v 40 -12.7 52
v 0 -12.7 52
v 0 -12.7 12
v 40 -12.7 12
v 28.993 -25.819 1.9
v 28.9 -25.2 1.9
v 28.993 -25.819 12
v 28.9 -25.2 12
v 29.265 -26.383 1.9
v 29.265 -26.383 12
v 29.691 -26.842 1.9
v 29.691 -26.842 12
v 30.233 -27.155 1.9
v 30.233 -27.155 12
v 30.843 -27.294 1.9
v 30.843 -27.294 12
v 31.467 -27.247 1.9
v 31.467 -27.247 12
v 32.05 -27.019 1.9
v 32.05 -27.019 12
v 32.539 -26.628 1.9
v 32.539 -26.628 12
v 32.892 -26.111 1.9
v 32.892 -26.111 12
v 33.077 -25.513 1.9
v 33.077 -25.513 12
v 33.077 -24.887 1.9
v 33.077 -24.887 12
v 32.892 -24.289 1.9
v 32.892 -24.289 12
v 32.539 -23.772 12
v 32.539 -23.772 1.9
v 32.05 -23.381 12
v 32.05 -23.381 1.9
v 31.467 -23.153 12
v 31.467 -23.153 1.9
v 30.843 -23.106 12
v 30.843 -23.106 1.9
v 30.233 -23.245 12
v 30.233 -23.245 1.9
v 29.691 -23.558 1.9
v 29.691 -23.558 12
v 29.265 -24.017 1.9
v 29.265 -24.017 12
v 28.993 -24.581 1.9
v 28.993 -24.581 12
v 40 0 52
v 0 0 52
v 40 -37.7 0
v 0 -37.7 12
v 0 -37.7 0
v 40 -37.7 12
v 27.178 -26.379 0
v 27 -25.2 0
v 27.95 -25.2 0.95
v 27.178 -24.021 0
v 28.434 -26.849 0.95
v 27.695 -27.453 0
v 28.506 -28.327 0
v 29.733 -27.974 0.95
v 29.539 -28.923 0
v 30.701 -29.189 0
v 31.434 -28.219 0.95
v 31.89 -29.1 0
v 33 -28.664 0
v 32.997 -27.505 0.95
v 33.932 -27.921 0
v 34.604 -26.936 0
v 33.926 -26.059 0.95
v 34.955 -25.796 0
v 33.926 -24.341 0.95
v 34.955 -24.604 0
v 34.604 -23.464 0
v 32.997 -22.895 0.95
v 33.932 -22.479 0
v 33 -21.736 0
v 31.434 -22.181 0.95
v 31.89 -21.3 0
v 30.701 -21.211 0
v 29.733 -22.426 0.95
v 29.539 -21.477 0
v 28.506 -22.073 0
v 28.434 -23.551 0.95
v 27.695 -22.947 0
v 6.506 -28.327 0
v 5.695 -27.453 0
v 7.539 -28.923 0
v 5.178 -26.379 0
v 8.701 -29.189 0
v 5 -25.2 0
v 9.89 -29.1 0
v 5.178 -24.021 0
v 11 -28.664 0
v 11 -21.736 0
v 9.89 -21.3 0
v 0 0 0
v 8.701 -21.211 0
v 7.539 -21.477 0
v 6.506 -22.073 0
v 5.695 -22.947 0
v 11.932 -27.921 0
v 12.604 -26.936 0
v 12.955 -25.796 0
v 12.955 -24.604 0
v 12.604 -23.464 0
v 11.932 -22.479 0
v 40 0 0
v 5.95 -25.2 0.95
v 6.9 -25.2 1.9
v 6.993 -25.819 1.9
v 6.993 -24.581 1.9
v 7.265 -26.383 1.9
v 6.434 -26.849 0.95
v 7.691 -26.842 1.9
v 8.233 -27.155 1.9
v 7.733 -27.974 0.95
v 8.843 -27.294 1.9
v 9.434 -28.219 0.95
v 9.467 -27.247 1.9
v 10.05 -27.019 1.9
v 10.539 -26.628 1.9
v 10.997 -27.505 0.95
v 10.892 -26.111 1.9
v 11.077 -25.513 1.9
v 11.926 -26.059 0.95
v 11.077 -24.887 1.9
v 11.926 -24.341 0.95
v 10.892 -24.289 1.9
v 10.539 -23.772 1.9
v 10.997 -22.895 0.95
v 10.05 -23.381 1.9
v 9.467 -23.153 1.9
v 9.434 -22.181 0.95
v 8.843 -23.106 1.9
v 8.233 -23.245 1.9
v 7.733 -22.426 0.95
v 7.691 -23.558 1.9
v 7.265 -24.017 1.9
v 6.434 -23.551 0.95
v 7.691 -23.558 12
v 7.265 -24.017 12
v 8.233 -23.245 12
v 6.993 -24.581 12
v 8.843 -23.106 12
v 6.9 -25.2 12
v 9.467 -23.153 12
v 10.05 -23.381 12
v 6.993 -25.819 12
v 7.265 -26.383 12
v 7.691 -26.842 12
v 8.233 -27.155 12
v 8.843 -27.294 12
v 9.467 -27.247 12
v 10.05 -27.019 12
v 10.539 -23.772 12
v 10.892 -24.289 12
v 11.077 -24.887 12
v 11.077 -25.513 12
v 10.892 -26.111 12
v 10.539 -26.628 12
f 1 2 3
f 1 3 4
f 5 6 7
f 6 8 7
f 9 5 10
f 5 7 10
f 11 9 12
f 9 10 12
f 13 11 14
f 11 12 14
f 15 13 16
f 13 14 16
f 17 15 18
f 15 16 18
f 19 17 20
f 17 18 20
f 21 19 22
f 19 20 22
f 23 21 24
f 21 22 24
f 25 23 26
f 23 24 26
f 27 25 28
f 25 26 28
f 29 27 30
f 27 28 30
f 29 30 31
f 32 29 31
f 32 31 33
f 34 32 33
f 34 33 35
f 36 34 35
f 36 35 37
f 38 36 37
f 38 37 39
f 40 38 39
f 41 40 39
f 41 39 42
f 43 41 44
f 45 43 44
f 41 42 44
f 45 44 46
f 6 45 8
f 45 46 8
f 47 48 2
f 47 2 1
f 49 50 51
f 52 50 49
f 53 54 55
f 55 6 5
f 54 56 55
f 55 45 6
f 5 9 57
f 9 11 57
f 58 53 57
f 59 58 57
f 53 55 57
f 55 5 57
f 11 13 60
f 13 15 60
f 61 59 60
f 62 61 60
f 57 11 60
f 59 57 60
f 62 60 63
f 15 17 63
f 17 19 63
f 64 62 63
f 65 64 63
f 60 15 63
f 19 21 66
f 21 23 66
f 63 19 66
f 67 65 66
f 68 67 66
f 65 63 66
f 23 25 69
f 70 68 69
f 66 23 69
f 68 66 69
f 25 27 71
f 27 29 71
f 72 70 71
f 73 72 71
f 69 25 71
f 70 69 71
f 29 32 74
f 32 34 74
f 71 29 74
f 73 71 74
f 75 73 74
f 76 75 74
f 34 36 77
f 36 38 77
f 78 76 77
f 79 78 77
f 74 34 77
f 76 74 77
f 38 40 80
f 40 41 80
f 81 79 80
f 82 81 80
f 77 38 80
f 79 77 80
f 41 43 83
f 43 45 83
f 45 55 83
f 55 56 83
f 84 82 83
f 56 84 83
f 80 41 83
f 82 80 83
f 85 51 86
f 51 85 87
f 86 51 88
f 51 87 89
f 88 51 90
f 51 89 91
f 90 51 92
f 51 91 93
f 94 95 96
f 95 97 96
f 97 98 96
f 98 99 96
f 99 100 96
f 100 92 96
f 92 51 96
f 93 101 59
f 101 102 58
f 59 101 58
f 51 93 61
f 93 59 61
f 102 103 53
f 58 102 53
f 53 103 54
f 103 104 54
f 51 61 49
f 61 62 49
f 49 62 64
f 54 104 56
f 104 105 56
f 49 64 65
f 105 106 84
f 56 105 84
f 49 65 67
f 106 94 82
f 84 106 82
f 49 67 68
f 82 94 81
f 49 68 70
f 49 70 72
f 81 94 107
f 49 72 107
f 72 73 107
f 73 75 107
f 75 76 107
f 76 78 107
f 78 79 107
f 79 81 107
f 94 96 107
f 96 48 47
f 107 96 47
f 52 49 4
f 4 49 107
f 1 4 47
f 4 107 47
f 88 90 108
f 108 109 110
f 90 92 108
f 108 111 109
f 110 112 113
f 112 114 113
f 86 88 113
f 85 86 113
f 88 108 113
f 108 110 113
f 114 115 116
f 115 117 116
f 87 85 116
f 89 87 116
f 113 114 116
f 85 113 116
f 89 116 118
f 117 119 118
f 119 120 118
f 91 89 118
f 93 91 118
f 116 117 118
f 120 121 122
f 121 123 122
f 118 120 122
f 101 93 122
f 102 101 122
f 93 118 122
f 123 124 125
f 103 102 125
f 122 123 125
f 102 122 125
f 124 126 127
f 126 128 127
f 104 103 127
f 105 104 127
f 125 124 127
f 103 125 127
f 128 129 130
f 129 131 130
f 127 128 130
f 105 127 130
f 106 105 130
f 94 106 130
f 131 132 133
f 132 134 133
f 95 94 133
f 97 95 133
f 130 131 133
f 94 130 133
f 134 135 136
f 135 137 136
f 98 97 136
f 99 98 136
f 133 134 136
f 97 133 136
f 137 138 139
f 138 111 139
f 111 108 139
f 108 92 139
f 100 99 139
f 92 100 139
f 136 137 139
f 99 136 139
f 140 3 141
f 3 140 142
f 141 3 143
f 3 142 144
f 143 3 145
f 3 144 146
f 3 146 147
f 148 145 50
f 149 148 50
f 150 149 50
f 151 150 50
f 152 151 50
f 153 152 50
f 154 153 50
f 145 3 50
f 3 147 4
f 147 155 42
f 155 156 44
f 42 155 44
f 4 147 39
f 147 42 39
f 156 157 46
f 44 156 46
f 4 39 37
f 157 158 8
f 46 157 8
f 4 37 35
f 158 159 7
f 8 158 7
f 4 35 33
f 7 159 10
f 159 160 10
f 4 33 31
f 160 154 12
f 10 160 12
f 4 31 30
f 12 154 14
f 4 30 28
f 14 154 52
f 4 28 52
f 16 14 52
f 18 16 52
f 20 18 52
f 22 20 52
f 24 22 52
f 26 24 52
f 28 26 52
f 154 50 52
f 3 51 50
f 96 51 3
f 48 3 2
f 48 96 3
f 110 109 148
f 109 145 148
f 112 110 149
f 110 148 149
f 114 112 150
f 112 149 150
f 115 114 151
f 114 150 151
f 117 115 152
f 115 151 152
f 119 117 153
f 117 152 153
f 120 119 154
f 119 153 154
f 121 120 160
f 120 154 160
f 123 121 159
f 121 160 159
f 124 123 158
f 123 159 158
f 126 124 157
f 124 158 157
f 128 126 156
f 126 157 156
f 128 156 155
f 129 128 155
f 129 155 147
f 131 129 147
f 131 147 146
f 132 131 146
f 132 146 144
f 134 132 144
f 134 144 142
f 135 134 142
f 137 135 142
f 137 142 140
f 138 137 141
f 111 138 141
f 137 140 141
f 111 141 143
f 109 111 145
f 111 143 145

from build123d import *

# Parameters (mm, degrees)
F0_W           = 40
F0_H           = 52
F1_DEPTH       = 37.7
F2_W           = 40
F2_H           = 40
F3_DEPTH       = 25
F5_D           = 4.2
F5_CSINK_D     = 8
F5_CSINK_ANGLE = 90


with BuildPart() as f1:
    # F0 (on Front) → F1 (new body)
    with BuildSketch(Plane.XZ):
        with Locations((20, 26)):
            Rectangle(F0_W, F0_H)
    extrude(amount=F1_DEPTH)

    # F2 (on face) → F3 (cut)
    with BuildSketch(Plane.XZ.offset(37.7)):
        with Locations((20, 32)):
            Rectangle(F2_W, F2_H)
    extrude(amount=-F3_DEPTH, mode=Mode.SUBTRACT)

    # F5 (through all)
    with Locations(Plane(origin=(0, 0, 0), x_dir=(1, 0, 0), z_dir=(0, 0, -1))):
        with Locations((9, 25.2), (31, 25.2)):
            CounterSinkHole(F5_D / 2, F5_CSINK_D / 2, counter_sink_angle=F5_CSINK_ANGLE)


solid = f1.part
